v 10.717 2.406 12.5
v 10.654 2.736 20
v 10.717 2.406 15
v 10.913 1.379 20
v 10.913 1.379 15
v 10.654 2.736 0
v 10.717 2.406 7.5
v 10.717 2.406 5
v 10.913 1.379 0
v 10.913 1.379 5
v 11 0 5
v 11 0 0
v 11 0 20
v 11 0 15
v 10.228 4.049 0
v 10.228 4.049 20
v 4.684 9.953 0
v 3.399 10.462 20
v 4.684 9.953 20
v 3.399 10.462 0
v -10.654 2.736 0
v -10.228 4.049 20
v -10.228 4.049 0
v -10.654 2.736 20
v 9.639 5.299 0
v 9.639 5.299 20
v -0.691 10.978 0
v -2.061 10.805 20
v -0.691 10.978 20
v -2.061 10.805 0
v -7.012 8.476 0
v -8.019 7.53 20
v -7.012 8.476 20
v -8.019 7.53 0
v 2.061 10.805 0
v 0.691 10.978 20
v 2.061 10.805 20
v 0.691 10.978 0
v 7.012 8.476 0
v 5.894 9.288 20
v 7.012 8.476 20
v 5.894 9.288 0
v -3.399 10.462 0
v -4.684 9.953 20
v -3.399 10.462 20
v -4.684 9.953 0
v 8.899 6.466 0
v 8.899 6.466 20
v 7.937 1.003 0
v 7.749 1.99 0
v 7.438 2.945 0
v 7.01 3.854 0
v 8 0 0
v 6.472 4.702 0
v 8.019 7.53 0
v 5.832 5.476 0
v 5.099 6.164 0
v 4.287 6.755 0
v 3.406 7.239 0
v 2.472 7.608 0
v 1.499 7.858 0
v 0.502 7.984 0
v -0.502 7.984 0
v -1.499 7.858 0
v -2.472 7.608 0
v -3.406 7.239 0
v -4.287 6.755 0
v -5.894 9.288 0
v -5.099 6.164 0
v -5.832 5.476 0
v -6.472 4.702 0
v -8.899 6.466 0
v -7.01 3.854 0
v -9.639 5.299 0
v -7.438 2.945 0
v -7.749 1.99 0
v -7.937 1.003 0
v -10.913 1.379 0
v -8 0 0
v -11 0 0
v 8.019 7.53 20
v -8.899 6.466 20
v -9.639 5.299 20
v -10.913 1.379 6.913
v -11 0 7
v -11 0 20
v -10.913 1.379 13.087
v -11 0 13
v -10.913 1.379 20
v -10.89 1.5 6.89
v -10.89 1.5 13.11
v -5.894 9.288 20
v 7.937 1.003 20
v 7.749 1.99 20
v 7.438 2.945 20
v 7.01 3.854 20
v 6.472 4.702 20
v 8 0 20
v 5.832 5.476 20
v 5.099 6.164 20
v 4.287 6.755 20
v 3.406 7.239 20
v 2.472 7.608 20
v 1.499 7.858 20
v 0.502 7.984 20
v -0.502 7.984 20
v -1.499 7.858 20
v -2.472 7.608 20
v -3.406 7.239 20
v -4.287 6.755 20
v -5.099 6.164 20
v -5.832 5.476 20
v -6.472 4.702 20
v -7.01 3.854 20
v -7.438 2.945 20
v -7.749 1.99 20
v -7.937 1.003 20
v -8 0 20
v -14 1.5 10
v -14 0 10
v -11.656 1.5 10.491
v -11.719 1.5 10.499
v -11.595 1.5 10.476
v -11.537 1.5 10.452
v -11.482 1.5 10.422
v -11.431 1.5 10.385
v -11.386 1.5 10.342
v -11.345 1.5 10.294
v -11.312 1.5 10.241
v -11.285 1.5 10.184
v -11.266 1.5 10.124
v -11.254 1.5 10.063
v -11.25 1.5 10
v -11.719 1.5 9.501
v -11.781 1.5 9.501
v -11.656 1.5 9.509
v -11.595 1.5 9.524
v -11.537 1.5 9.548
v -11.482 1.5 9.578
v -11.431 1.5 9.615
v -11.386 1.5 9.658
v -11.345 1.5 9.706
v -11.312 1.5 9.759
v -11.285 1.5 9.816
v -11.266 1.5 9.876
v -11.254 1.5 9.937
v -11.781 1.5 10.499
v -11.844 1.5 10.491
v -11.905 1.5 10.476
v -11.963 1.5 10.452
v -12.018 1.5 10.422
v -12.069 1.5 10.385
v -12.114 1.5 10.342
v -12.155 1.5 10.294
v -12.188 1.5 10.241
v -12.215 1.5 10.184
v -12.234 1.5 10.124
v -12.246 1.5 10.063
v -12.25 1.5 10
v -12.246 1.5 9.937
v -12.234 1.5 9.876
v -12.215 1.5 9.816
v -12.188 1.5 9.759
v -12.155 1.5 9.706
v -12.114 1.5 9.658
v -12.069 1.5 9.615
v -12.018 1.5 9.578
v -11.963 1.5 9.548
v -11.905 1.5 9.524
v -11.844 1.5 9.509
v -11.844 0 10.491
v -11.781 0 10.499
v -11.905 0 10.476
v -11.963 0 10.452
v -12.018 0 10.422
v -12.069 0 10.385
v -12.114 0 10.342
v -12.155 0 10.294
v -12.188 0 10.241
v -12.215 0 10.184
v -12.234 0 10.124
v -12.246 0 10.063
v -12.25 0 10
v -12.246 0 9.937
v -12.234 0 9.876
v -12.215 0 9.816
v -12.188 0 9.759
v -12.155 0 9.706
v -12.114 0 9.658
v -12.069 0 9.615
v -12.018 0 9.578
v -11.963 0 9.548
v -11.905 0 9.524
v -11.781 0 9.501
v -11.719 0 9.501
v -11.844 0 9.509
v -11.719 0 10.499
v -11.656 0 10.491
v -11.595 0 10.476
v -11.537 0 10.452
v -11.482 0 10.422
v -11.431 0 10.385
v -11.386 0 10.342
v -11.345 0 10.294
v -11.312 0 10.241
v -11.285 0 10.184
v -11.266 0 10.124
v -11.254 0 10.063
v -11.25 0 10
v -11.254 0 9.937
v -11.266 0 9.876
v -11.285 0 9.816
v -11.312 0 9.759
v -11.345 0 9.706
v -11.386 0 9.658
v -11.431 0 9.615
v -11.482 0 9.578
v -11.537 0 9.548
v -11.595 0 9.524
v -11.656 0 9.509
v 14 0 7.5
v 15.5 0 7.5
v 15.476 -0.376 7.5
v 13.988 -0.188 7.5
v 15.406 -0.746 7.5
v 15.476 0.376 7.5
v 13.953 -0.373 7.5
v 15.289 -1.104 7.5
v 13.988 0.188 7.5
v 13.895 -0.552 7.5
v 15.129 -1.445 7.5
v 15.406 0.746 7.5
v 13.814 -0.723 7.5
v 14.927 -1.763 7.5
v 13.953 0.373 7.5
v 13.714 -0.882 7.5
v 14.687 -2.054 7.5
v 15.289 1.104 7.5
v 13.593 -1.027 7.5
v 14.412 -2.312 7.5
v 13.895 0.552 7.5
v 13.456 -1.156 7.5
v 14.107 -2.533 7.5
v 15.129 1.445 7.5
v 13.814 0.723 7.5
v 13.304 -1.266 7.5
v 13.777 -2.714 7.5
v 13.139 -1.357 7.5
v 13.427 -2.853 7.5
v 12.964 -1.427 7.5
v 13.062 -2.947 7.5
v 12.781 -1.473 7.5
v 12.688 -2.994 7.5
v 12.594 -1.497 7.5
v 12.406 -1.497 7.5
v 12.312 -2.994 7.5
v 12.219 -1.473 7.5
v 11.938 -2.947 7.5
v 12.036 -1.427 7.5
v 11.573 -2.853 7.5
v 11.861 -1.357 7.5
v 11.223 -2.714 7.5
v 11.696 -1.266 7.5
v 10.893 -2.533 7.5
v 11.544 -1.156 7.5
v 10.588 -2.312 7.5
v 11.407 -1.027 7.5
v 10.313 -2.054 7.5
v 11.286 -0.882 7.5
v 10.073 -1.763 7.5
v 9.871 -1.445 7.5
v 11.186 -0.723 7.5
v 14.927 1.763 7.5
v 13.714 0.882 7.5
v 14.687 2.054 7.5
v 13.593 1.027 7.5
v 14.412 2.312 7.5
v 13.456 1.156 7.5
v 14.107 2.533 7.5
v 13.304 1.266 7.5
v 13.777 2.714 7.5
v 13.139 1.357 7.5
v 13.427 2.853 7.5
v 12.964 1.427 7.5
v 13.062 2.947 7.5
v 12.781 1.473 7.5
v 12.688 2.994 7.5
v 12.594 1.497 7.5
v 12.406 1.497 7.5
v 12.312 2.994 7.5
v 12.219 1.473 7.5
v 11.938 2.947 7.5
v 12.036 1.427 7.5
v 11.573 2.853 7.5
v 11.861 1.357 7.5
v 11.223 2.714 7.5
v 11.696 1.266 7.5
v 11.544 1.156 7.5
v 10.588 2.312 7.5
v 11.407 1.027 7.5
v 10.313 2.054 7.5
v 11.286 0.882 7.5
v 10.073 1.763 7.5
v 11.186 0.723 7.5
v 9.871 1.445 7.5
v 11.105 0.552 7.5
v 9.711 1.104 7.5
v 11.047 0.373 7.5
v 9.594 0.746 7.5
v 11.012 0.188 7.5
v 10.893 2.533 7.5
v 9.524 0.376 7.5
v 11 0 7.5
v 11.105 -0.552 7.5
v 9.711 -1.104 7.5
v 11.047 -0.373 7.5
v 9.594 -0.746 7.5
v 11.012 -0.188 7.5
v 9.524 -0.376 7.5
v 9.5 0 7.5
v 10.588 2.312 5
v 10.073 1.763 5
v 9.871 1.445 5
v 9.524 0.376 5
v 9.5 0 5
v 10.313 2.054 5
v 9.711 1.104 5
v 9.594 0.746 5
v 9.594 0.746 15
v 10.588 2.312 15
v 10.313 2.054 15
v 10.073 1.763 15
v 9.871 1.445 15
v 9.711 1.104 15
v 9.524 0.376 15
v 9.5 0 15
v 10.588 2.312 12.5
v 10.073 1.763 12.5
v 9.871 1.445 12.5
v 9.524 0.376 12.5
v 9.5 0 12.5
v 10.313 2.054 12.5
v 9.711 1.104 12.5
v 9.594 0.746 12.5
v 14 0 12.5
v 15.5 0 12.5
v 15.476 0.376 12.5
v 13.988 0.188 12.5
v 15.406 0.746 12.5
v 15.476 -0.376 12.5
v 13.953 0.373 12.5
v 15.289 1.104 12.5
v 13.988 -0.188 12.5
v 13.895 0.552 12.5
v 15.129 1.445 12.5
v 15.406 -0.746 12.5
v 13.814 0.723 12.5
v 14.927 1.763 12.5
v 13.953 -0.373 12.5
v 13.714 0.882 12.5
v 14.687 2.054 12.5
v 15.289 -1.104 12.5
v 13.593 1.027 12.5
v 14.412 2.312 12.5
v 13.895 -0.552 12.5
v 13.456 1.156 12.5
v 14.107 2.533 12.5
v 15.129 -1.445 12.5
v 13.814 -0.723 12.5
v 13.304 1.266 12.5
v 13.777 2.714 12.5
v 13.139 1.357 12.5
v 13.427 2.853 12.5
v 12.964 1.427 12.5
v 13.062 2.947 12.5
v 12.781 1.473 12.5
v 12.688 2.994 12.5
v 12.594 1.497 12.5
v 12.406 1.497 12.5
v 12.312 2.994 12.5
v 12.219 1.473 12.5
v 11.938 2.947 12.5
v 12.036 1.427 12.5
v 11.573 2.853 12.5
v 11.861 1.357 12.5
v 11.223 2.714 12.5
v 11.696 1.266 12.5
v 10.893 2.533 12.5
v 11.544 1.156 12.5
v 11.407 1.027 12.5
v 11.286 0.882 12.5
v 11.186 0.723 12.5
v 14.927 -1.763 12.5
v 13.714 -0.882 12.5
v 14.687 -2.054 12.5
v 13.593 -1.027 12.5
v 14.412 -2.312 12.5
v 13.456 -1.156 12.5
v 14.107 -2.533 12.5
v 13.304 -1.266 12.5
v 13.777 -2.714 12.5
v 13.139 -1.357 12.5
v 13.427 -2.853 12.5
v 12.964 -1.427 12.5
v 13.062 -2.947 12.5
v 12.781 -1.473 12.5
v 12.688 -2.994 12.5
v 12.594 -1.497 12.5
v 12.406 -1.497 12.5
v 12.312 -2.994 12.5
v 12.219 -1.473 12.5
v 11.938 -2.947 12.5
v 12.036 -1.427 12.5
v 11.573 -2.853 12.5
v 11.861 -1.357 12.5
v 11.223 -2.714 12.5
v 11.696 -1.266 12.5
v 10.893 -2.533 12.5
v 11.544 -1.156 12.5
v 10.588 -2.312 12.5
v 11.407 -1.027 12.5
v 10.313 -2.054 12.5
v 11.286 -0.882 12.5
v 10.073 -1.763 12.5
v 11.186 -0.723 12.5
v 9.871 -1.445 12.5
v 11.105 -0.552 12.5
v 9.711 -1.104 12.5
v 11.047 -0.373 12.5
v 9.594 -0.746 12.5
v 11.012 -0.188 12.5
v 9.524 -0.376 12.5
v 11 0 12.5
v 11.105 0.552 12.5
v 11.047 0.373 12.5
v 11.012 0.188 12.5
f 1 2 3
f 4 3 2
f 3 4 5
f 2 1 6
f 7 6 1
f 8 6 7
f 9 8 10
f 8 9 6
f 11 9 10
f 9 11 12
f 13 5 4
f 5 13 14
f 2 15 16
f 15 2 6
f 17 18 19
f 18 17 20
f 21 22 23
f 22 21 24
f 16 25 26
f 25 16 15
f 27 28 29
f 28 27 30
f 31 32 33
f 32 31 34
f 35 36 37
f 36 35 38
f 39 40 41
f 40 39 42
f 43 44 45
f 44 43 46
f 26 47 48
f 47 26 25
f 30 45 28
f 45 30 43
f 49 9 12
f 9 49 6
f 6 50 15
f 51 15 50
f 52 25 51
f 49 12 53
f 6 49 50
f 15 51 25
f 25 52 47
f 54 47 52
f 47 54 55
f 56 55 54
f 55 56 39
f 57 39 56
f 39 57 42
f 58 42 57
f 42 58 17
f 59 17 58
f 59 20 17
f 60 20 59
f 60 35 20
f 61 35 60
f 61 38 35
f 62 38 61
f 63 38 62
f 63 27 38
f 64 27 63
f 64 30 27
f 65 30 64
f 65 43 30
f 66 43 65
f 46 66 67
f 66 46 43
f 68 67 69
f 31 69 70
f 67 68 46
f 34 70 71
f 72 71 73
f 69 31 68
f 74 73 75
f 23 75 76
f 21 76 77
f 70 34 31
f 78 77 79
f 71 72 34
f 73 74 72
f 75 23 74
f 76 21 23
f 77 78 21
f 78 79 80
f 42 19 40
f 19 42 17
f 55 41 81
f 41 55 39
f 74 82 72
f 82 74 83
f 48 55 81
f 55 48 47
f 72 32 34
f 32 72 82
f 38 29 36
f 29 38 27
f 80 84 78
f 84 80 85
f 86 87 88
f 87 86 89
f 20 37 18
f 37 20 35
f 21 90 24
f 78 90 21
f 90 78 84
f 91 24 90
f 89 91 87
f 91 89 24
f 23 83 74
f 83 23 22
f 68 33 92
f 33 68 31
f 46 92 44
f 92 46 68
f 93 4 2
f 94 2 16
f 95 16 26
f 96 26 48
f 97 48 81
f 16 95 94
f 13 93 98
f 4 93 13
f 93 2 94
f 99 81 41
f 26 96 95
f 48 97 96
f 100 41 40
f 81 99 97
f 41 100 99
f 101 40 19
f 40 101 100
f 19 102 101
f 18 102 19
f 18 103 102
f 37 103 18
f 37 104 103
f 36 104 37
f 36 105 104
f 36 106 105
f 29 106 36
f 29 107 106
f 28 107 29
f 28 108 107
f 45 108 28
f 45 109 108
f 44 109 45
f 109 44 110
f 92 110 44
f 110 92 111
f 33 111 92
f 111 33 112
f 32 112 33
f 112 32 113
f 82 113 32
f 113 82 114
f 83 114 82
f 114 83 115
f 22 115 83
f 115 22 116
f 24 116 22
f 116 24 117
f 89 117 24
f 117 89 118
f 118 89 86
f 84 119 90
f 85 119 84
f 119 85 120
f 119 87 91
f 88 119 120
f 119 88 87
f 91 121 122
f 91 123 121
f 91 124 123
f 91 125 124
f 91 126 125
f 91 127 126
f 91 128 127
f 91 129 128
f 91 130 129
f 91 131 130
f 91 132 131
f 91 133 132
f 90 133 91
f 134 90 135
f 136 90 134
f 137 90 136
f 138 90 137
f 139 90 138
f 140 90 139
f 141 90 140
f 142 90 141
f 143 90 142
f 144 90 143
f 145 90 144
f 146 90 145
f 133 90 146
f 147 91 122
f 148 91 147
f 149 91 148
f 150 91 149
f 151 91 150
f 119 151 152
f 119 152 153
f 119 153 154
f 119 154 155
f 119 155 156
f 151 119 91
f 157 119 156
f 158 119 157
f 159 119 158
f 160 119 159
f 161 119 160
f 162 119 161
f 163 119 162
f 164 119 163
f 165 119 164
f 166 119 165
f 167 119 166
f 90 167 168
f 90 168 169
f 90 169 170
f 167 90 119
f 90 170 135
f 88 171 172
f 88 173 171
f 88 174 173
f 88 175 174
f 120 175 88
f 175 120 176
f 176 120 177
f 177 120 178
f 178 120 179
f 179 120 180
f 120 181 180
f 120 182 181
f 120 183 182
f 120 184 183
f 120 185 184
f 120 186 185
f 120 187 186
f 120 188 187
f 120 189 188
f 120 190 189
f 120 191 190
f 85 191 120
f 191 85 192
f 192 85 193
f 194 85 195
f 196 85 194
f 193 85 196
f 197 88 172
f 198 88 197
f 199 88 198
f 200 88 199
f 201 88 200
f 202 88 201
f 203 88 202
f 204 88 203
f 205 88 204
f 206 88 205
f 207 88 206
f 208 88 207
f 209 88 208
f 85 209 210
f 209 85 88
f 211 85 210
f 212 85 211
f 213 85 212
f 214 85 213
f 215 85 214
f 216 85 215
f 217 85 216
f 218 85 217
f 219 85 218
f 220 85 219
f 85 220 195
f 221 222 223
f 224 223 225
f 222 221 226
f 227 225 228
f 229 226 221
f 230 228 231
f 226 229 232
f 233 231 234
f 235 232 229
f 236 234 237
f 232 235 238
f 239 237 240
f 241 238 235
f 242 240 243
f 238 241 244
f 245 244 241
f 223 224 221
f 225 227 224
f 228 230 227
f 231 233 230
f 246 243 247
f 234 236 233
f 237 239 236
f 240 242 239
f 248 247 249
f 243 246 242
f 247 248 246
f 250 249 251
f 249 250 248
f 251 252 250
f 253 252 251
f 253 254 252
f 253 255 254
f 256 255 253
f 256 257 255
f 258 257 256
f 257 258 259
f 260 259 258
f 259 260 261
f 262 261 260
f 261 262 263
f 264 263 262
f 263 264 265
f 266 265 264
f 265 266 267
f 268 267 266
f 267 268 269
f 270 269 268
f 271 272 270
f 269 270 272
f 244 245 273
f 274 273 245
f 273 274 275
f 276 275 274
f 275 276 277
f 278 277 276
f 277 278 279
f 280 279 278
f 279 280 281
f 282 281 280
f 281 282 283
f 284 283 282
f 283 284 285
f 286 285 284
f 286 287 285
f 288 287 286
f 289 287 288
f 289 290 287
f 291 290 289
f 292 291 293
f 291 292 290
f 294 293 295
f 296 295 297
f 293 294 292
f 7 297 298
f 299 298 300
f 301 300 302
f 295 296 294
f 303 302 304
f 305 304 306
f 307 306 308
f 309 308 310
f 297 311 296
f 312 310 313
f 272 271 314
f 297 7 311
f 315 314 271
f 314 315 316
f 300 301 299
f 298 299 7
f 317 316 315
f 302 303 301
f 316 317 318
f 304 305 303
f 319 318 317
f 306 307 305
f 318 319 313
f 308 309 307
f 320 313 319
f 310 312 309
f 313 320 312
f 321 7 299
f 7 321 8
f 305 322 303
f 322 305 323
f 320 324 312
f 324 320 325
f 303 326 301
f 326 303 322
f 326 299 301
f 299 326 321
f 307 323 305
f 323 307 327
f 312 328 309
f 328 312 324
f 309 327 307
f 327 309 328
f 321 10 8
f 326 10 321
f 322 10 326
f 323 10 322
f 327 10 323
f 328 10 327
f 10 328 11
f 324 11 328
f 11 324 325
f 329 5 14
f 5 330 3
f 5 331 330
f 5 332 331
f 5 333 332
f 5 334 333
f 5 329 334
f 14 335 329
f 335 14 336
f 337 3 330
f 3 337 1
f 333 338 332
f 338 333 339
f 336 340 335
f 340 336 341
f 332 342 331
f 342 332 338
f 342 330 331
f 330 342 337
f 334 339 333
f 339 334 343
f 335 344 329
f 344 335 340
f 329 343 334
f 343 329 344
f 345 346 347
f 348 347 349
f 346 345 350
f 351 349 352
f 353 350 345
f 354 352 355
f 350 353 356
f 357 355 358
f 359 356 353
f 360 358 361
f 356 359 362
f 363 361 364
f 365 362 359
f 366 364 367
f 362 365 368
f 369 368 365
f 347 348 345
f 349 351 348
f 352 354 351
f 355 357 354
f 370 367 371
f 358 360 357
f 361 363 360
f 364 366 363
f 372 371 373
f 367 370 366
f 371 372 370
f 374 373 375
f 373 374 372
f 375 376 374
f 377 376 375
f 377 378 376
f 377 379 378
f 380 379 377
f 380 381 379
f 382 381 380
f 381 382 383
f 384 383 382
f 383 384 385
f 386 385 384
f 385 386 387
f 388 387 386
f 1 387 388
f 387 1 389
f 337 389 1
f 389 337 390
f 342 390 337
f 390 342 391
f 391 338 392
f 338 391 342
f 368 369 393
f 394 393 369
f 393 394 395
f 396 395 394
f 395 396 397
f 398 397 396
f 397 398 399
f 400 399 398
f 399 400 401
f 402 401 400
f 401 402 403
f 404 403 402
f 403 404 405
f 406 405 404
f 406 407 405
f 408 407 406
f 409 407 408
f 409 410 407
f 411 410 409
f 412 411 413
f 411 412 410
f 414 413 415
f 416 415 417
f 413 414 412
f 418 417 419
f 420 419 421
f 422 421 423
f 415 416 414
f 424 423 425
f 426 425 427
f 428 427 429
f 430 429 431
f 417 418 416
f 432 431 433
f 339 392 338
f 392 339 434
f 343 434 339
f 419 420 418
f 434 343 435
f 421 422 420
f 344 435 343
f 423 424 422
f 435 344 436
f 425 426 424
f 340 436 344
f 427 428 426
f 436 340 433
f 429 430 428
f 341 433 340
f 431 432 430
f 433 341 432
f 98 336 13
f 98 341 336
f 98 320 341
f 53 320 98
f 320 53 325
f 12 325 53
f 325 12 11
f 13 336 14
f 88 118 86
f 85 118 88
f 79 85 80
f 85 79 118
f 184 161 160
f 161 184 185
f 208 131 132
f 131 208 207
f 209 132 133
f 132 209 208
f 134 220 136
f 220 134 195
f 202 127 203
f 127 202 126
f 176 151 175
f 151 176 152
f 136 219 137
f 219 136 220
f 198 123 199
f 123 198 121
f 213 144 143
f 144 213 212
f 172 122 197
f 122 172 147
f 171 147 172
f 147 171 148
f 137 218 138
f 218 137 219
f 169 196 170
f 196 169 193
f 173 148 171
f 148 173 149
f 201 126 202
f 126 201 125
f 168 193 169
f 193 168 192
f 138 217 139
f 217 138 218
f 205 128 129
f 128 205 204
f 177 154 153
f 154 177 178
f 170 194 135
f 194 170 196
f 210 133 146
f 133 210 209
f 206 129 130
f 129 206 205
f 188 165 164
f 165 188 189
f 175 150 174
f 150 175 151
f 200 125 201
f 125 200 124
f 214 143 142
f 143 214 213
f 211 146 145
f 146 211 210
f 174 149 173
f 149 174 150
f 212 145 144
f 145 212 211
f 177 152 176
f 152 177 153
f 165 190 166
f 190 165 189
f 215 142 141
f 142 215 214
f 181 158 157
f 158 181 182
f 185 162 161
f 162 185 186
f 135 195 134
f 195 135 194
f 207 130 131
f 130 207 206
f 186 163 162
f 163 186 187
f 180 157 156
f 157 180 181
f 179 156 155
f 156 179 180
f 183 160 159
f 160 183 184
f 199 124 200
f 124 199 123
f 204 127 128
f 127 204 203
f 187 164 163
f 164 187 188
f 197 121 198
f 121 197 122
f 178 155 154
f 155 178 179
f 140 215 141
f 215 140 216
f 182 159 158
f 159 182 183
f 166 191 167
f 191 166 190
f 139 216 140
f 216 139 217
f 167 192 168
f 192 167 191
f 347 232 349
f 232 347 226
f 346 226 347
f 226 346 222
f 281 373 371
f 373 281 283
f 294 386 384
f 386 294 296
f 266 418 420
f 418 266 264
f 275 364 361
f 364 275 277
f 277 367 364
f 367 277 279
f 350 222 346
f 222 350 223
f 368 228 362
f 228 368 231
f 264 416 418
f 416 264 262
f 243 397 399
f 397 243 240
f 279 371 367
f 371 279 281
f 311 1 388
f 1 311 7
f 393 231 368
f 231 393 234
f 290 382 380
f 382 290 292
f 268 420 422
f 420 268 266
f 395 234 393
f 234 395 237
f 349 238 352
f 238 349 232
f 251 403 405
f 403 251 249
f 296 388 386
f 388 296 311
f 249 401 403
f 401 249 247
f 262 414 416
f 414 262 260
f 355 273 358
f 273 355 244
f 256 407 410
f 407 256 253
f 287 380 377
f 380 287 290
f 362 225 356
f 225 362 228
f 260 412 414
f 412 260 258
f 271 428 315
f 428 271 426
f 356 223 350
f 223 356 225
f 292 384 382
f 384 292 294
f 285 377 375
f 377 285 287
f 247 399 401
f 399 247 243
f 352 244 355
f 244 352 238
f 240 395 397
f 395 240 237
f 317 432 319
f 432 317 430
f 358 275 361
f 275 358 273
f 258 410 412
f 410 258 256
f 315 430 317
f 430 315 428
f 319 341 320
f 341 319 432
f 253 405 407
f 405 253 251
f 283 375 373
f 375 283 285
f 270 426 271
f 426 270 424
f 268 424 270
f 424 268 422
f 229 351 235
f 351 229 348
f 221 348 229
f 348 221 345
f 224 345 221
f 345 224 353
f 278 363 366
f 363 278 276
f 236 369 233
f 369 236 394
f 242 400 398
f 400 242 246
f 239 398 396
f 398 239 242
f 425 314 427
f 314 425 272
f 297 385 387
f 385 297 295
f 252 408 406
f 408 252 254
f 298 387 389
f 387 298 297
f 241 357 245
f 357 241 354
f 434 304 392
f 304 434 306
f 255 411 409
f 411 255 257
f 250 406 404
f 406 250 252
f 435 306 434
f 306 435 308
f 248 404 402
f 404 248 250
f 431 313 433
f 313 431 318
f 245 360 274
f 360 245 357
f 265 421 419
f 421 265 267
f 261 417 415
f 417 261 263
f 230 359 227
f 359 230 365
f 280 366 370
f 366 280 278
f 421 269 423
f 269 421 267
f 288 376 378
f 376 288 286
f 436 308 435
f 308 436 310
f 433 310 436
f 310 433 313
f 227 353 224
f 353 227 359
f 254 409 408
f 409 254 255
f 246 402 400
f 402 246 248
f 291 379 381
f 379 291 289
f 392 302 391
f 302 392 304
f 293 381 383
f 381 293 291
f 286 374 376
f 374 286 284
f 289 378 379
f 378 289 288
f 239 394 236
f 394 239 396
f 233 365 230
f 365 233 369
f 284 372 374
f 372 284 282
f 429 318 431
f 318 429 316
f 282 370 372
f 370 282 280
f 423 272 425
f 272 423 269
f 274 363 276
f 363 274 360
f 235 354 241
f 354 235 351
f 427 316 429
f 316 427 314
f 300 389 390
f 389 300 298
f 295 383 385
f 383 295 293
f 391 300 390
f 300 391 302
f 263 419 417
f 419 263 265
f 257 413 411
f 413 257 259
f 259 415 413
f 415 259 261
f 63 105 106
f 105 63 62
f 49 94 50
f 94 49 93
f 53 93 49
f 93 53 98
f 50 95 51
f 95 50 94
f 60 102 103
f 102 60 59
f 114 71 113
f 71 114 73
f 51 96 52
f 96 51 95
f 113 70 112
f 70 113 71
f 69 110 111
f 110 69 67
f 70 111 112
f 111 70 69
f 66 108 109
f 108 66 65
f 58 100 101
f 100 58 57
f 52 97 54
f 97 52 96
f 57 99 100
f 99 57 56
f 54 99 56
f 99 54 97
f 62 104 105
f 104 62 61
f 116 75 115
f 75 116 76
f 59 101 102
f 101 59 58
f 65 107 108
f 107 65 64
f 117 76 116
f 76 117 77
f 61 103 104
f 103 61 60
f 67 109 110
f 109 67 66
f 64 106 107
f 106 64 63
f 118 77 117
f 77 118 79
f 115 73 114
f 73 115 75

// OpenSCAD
// file: holder.scad
include<dimensions.scad>

//first_half = true;

module bar() {
    cylinder(h = bar_height, r = bar_radius);
}

module clamp(first_half = true) {
    // hinge
    if (first_half == true) {
        translate([hinge_position_x, 0, (clamp_height - hinge_height) / 2])cylinder(h = hinge_height / 4 - printer_tolerance, r = hinge_radius);
        translate([hinge_position_x, 0, (clamp_height + hinge_height) / 2 - hinge_height / 4 + printer_tolerance])cylinder(h = hinge_height / 4 - printer_tolerance, r = hinge_radius);
    } else {
        translate([hinge_position_x, 0, (clamp_height - hinge_height) / 2 + hinge_height / 4])cylinder(h = hinge_height / 2, r = hinge_radius);
//        translate([hinge_position_x, 0, (clamp_height - hinge_height) / 2 + hinge_height / 4])cylinder(h = hinge_height / 2, r = hinge_radius);
    }
    difference()  {
        clamp_positive(first_half);
        clamp_negative(first_half);
    }
}

module clamp_positive(first_half = true) {
    // clamp body
    cylinder(h = clamp_height, r = bar_radius + clamp_thickness);
    if (first_half == true) {
        // hinge
//        translate([hinge_position_x, 0, (clamp_height - hinge_height) / 2])cylinder(h = hinge_height, r = hinge_radius);
        // lock
        translate([- (bar_radius + clamp_thickness + clamp_thickness), -.5 * clamp_thickness, clamp_height / 2])rotate([0, 45, 0])cube([2 * clamp_thickness, .5 * clamp_thickness, 2 * clamp_thickness]);
    } else {
        // hinge
//        translate([hinge_position_x, 0, (clamp_height - hinge_height) / 2 + hinge_height / 4])cylinder(h = hinge_height / 2, r = hinge_radius);
        // lock
        translate([- (bar_radius + clamp_thickness + clamp_thickness), 0 * clamp_thickness, clamp_height / 2])rotate([0, 45, 0])cube([2 * clamp_thickness, .5 * clamp_thickness, 2 * clamp_thickness]);
    }
}

module clamp_negative(first_half = true) {

    // body
    if (first_half == true) {
        rotate([0, 0, 90])translate([0, -1 * (bar_radius + clamp_thickness), 0])cube([bar_radius + clamp_thickness, (bar_radius + clamp_thickness) * 2, clamp_height]);
    } else {
        rotate([0, 0, 90])translate([-1 * (bar_radius + clamp_thickness), -1 * (bar_radius + clamp_thickness), 0])cube([bar_radius + clamp_thickness, (bar_radius + clamp_thickness) * 2, clamp_height]);
    }
    // lock
    translate([-1 * (bar_radius + clamp_thickness + clamp_thickness / 4), clamp_thickness / 2, clamp_height / 2])rotate([90, 0, 0])cylinder(h = clamp_thickness, r = screwhole_radius);
    if (first_half == true) {
        // hinge
        translate([hinge_position_x, 0, (clamp_height - hinge_height / 2) / 2 - printer_tolerance])cylinder(h = hinge_height * .5 + printer_tolerance * 2, r = hinge_radius);
    } else {
        // hinge
        translate([hinge_position_x, 0, (clamp_height - hinge_height) / 2])cylinder(h = hinge_height / 4, r = hinge_radius);
        translate([hinge_position_x, 0, clamp_height / 2 + hinge_height / 4])cylinder(h = hinge_height / 4, r = hinge_radius);
    }
}

module holder(first_half = true) {
    difference() {
        clamp(first_half);
        negative(first_half);
    }
}

module negative(first_half = true) {
    translate([hinge_position_x, 0, (clamp_height - hinge_height) / 2])cylinder(h = hinge_height, r = hinge_axis_radius);
    translate([0, 0, -bar_height / 2])bar();

    // negative for first half
    if (first_half == true) {
//        rotate([0, 0, 90])translate([0, -1 * (bar_radius + clamp_thickness), 0])cube([bar_radius + clamp_thickness, (bar_radius + clamp_thickness) * 2, clamp_height]);
    }
}
// file: dimensions.scad
$fn = 50;

bar_radius = 8;
bar_height = 500;

clamp_height = 20;
clamp_thickness = 3;

hinge_radius = clamp_thickness;
hinge_axis_radius = clamp_thickness / 2;
hinge_height = clamp_height / 2;

hinge_position_x = bar_radius + clamp_thickness + hinge_axis_radius;

printer_tolerance = .2;

screwhole_radius = .5;
// main file
include<dimensions.scad>

use<holder.scad>

// vitamins
//use<vitamins/jst_bec.scad>

holder(false);
//translate([40, 0, 0])holder(false);
//translate([hinge_position_x, 0, 0,])rotate([0, 0 , -$t*90])translate([-hinge_position_x, 0, 0,])holder(false);
